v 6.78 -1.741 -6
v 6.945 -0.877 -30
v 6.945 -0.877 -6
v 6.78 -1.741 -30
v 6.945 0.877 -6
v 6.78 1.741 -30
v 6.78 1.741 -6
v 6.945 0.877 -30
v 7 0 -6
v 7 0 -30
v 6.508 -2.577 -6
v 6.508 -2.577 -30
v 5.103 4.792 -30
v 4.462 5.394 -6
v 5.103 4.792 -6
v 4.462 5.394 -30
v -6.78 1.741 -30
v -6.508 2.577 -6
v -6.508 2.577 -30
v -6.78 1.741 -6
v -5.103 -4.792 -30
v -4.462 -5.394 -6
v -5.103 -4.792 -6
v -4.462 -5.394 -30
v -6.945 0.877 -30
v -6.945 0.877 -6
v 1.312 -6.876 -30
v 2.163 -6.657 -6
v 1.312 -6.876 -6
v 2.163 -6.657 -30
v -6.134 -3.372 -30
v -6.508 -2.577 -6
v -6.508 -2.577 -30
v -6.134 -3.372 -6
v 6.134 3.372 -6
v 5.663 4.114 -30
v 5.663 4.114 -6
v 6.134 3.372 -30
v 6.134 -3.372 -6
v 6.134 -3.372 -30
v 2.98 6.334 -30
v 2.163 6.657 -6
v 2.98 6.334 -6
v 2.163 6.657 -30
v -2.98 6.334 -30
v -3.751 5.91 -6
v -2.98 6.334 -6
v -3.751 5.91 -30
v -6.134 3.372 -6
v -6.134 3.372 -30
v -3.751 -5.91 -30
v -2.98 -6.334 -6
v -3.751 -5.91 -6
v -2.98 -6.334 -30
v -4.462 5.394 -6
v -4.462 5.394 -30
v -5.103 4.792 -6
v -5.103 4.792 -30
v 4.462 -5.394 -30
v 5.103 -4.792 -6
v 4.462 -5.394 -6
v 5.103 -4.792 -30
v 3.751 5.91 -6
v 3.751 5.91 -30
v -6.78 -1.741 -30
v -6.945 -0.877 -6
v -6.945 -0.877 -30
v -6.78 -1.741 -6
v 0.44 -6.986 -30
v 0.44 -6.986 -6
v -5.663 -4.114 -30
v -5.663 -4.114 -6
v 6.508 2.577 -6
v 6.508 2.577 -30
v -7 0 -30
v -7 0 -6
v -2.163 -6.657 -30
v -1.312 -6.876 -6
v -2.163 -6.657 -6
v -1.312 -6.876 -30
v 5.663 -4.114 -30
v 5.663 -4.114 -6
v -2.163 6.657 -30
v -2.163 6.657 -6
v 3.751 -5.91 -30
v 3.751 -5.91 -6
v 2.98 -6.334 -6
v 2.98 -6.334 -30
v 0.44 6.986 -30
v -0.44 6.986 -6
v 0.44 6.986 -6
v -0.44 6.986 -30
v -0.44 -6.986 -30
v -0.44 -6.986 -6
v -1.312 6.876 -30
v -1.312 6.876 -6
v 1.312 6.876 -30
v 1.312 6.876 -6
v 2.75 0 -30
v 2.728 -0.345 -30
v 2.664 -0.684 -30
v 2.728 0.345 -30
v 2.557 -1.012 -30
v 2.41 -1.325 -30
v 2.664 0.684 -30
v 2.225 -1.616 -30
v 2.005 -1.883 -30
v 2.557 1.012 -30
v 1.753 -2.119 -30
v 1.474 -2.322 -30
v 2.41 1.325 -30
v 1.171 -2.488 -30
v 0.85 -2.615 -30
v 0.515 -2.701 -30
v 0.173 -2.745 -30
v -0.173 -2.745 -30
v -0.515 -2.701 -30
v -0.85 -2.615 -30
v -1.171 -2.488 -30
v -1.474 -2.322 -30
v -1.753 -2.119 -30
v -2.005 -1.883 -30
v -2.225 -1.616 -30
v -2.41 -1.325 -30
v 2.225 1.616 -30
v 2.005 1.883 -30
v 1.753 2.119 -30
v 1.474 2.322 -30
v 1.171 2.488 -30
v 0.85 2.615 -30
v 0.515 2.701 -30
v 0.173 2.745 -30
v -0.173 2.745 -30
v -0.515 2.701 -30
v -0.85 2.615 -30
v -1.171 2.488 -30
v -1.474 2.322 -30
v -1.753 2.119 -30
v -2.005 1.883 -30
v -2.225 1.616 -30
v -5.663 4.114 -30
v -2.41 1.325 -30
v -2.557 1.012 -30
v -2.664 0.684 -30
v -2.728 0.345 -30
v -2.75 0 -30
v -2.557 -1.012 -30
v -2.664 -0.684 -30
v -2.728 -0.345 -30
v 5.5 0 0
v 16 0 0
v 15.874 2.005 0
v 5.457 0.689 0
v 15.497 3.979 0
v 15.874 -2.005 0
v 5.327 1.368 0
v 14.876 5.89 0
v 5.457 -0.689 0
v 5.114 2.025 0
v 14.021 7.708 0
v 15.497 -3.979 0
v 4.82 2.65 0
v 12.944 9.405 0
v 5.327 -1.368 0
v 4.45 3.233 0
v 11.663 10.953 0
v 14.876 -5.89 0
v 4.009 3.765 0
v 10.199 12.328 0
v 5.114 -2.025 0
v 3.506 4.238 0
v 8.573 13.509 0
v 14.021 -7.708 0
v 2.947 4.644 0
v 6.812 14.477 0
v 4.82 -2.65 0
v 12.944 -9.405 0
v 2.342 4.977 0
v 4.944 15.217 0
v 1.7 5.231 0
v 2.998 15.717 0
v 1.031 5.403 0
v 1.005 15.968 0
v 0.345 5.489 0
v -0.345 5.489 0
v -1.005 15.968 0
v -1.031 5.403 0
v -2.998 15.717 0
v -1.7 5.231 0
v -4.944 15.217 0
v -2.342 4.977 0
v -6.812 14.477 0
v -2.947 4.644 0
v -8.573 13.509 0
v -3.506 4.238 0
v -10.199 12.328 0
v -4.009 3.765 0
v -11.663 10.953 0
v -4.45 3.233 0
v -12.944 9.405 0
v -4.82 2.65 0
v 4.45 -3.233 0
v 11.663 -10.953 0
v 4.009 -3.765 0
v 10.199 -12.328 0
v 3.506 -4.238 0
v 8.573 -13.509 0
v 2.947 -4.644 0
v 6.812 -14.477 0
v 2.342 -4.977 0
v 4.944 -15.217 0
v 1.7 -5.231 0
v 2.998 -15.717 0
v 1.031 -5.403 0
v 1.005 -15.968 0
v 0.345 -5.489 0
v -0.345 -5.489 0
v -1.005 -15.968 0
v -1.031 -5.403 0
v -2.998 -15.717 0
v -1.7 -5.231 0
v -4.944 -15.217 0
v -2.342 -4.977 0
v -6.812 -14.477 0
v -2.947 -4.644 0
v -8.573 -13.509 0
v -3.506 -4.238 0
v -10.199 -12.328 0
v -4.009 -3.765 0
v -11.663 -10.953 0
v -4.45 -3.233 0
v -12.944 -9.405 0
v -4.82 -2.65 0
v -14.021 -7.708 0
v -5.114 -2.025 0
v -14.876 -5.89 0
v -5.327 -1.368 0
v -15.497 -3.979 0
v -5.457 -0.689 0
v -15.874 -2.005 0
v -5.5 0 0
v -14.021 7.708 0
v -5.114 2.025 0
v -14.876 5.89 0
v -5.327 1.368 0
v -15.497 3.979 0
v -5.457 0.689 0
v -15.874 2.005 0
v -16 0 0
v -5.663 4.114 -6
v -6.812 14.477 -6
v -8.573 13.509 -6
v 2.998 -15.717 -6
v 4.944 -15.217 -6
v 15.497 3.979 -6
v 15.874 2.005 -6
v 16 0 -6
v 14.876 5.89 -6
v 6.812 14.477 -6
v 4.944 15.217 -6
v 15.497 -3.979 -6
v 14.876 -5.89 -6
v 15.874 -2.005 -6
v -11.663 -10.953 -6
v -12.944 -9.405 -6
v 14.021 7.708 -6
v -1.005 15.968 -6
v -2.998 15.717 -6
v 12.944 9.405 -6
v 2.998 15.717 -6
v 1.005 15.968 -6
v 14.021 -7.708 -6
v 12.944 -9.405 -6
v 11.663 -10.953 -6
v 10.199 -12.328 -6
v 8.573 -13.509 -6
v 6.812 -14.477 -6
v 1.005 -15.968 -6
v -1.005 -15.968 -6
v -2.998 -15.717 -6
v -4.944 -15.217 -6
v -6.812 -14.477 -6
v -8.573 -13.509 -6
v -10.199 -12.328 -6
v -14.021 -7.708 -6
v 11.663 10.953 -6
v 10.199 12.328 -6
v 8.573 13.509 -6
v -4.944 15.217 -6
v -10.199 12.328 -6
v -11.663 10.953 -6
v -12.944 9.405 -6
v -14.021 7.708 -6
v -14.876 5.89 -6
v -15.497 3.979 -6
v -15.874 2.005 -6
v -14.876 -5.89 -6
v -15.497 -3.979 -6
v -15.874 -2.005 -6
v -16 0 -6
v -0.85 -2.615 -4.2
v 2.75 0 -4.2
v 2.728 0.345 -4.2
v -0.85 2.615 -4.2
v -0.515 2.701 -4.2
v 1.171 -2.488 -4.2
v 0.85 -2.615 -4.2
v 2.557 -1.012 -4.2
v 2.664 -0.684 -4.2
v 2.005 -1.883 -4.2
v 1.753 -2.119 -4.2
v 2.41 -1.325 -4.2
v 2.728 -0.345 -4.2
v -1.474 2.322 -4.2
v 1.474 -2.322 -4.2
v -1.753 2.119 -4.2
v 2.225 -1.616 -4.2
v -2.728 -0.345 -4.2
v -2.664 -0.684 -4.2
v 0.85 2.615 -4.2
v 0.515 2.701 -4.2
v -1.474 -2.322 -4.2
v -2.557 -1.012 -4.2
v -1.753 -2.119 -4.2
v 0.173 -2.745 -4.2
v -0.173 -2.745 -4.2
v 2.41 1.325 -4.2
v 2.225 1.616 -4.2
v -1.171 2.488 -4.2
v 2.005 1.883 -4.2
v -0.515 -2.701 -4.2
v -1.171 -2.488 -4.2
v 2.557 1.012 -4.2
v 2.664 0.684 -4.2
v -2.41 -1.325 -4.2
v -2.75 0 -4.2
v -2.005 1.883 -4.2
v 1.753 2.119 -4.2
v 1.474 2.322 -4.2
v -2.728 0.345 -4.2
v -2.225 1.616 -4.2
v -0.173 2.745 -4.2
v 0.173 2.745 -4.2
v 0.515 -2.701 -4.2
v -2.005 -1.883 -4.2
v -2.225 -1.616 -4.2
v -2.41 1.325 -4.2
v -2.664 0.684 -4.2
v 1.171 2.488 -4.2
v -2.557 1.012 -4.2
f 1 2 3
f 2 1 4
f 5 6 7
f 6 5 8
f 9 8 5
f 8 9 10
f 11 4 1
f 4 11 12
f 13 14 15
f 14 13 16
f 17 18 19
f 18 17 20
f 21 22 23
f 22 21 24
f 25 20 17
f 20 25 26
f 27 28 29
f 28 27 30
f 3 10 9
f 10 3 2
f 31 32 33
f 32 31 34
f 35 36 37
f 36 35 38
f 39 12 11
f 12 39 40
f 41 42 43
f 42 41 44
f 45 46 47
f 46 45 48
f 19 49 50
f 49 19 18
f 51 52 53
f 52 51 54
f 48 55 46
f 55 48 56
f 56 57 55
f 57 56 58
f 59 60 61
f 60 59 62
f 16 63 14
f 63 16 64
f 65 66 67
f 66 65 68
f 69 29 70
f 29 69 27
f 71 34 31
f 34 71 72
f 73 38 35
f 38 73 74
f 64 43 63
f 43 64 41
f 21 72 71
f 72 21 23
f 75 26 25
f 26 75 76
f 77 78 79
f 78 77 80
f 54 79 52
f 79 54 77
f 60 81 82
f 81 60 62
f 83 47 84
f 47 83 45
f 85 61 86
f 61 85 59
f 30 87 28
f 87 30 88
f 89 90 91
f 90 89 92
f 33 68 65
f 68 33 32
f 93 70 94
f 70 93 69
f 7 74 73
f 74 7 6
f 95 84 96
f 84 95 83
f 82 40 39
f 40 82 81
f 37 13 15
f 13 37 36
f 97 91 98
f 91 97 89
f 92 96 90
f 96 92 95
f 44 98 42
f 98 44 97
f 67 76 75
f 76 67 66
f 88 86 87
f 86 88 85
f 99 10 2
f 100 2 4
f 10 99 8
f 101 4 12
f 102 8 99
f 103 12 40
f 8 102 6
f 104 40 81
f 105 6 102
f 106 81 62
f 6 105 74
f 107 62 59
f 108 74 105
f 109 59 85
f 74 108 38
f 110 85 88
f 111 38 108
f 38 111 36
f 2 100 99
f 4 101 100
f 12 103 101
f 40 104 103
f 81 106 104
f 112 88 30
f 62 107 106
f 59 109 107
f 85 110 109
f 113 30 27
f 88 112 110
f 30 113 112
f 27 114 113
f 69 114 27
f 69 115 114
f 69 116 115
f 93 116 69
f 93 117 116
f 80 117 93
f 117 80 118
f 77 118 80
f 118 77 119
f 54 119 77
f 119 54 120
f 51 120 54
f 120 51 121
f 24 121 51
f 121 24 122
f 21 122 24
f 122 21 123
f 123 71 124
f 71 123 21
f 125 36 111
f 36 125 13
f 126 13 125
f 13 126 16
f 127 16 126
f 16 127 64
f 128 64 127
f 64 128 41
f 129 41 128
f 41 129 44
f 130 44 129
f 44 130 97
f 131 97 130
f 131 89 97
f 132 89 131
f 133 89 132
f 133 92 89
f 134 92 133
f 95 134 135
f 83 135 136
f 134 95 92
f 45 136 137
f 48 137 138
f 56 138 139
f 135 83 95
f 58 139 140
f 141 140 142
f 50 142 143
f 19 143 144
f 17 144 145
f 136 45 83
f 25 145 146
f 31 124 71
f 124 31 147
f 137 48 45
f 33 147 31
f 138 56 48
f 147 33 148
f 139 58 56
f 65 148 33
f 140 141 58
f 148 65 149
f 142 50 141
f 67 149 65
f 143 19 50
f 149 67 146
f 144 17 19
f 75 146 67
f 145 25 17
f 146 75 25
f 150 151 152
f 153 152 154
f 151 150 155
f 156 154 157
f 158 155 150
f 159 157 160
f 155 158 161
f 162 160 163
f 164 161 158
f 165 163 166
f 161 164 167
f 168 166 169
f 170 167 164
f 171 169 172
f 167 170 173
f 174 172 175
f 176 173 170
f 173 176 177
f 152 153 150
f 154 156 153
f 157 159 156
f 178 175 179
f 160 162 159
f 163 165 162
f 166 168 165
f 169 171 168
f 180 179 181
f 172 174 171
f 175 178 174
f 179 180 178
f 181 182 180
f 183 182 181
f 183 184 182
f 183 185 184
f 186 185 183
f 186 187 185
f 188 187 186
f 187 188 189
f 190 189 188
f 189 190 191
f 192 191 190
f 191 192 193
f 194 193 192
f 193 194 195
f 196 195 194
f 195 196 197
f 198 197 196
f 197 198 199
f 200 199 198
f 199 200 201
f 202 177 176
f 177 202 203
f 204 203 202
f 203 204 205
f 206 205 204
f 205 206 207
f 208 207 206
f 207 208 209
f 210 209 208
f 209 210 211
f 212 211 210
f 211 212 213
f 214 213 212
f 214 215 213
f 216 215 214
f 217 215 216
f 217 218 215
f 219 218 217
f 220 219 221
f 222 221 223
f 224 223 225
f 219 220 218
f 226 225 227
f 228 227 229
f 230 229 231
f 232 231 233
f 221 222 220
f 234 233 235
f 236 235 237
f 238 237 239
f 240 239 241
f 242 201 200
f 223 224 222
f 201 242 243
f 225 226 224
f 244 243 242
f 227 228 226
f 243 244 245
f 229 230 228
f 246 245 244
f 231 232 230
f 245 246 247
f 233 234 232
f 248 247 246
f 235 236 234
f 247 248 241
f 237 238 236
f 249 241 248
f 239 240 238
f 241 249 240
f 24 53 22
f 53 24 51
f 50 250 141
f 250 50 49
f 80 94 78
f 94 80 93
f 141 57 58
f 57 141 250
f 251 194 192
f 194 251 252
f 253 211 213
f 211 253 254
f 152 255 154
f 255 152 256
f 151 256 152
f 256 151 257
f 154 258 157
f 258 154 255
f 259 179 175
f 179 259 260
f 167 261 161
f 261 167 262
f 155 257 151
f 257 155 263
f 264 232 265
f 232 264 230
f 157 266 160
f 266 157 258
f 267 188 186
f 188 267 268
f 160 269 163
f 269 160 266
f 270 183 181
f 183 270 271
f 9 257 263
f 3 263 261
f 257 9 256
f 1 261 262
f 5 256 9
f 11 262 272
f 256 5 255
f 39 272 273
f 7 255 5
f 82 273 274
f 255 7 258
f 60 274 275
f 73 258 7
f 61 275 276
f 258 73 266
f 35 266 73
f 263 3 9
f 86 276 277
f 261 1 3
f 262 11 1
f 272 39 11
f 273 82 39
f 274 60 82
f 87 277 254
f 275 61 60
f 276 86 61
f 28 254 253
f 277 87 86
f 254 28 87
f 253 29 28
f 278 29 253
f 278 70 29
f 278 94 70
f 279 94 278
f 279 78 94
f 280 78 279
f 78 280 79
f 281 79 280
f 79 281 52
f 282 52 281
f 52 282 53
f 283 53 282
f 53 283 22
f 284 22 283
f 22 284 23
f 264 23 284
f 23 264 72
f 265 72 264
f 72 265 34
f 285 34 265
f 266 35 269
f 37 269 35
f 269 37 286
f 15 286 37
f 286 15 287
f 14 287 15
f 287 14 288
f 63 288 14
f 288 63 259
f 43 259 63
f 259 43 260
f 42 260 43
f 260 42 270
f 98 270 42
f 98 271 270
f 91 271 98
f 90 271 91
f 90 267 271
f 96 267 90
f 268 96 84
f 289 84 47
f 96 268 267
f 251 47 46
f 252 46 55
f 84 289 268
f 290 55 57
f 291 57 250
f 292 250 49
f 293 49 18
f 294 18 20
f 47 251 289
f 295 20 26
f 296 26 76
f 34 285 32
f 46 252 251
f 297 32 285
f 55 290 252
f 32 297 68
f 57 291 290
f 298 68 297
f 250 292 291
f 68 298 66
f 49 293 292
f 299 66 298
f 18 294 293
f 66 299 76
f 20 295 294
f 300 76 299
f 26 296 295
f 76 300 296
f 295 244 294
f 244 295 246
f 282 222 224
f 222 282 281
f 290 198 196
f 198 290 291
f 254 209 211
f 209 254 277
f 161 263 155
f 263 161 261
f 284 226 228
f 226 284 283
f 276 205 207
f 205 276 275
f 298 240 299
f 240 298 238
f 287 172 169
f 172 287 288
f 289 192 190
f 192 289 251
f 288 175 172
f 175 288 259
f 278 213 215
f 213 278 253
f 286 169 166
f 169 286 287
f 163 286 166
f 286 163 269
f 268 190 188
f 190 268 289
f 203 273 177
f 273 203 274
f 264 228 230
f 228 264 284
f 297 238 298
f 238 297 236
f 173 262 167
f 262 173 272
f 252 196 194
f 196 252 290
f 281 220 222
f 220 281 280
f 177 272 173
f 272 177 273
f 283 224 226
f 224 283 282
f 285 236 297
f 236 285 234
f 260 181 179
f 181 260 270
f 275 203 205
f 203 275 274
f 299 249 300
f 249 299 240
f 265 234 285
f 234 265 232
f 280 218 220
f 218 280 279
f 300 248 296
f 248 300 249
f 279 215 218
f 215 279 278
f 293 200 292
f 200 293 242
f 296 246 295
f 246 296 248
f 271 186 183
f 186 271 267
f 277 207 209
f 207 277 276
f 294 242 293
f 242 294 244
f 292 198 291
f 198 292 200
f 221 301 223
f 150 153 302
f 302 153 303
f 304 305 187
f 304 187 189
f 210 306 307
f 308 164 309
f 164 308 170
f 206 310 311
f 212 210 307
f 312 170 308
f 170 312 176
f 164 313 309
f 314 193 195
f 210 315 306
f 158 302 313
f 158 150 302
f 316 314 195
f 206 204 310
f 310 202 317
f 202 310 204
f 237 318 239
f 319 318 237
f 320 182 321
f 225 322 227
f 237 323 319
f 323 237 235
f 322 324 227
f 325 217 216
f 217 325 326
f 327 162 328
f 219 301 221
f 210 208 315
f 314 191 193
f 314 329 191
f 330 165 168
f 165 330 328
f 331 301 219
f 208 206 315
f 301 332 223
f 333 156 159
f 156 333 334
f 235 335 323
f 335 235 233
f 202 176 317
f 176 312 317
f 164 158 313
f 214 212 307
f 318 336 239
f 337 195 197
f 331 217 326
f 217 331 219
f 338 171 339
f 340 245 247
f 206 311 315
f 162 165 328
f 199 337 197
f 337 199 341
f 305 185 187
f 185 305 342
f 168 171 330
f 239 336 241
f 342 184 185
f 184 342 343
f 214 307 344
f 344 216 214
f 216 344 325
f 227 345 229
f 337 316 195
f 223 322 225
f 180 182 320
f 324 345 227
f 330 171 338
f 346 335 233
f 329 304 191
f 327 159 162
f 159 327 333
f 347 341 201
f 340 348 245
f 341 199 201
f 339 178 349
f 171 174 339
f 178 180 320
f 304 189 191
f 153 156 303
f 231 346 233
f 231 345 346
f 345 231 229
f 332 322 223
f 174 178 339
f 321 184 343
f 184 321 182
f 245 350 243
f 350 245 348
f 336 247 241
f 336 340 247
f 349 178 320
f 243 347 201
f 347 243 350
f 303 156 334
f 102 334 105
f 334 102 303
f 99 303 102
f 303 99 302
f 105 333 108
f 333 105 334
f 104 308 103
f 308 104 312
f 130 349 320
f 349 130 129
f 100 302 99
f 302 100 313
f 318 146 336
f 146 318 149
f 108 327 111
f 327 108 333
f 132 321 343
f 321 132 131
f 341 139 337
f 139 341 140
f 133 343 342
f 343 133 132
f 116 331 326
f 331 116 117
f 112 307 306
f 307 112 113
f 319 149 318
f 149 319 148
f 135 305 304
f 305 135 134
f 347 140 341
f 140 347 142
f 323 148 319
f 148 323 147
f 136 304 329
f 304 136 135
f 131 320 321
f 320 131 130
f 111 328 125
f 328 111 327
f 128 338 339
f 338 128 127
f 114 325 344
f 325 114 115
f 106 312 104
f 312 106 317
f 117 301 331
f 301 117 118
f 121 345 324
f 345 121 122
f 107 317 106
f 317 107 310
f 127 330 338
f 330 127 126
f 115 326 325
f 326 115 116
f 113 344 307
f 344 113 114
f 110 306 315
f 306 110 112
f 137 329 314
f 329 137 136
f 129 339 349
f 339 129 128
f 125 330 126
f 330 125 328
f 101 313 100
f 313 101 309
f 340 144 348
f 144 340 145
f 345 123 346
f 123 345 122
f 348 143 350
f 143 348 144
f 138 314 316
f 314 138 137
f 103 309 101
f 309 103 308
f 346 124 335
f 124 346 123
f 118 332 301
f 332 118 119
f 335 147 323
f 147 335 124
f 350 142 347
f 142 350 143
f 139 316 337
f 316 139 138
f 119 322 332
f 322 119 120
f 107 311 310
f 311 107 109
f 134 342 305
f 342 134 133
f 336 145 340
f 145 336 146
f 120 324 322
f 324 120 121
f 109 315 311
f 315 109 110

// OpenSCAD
$fn = 50;


difference() {
	union() {
		translate(v = [0, 0, -30.0000000000]) {
			cylinder(h = 30, r = 7.0000000000);
		}
		translate(v = [0, 0, -6.0000000000]) {
			cylinder(h = 6, r = 16.0000000000);
		}
	}
	union() {
		translate(v = [0, 0, 0]) {
			rotate(a = [0, 0, 0]) {
				difference() {
					union() {
						#translate(v = [0, 0, -30.0000000000]) {
							cylinder(h = 30, r = 2.2500000000);
						}
						#translate(v = [0, 0, -4.2000000000]) {
							cylinder(h = 4.2000000000, r = 7.0000000000, r1 = 2.7500000000, r2 = 5.5000000000);
						}
						#translate(v = [0, 0, -30.0000000000]) {
							cylinder(h = 30, r = 2.7500000000);
						}
						#translate(v = [0, 0, -30.0000000000]) {
							cylinder(h = 30, r = 2.2500000000);
						}
					}
					union();
				}
			}
		}
	}
}
